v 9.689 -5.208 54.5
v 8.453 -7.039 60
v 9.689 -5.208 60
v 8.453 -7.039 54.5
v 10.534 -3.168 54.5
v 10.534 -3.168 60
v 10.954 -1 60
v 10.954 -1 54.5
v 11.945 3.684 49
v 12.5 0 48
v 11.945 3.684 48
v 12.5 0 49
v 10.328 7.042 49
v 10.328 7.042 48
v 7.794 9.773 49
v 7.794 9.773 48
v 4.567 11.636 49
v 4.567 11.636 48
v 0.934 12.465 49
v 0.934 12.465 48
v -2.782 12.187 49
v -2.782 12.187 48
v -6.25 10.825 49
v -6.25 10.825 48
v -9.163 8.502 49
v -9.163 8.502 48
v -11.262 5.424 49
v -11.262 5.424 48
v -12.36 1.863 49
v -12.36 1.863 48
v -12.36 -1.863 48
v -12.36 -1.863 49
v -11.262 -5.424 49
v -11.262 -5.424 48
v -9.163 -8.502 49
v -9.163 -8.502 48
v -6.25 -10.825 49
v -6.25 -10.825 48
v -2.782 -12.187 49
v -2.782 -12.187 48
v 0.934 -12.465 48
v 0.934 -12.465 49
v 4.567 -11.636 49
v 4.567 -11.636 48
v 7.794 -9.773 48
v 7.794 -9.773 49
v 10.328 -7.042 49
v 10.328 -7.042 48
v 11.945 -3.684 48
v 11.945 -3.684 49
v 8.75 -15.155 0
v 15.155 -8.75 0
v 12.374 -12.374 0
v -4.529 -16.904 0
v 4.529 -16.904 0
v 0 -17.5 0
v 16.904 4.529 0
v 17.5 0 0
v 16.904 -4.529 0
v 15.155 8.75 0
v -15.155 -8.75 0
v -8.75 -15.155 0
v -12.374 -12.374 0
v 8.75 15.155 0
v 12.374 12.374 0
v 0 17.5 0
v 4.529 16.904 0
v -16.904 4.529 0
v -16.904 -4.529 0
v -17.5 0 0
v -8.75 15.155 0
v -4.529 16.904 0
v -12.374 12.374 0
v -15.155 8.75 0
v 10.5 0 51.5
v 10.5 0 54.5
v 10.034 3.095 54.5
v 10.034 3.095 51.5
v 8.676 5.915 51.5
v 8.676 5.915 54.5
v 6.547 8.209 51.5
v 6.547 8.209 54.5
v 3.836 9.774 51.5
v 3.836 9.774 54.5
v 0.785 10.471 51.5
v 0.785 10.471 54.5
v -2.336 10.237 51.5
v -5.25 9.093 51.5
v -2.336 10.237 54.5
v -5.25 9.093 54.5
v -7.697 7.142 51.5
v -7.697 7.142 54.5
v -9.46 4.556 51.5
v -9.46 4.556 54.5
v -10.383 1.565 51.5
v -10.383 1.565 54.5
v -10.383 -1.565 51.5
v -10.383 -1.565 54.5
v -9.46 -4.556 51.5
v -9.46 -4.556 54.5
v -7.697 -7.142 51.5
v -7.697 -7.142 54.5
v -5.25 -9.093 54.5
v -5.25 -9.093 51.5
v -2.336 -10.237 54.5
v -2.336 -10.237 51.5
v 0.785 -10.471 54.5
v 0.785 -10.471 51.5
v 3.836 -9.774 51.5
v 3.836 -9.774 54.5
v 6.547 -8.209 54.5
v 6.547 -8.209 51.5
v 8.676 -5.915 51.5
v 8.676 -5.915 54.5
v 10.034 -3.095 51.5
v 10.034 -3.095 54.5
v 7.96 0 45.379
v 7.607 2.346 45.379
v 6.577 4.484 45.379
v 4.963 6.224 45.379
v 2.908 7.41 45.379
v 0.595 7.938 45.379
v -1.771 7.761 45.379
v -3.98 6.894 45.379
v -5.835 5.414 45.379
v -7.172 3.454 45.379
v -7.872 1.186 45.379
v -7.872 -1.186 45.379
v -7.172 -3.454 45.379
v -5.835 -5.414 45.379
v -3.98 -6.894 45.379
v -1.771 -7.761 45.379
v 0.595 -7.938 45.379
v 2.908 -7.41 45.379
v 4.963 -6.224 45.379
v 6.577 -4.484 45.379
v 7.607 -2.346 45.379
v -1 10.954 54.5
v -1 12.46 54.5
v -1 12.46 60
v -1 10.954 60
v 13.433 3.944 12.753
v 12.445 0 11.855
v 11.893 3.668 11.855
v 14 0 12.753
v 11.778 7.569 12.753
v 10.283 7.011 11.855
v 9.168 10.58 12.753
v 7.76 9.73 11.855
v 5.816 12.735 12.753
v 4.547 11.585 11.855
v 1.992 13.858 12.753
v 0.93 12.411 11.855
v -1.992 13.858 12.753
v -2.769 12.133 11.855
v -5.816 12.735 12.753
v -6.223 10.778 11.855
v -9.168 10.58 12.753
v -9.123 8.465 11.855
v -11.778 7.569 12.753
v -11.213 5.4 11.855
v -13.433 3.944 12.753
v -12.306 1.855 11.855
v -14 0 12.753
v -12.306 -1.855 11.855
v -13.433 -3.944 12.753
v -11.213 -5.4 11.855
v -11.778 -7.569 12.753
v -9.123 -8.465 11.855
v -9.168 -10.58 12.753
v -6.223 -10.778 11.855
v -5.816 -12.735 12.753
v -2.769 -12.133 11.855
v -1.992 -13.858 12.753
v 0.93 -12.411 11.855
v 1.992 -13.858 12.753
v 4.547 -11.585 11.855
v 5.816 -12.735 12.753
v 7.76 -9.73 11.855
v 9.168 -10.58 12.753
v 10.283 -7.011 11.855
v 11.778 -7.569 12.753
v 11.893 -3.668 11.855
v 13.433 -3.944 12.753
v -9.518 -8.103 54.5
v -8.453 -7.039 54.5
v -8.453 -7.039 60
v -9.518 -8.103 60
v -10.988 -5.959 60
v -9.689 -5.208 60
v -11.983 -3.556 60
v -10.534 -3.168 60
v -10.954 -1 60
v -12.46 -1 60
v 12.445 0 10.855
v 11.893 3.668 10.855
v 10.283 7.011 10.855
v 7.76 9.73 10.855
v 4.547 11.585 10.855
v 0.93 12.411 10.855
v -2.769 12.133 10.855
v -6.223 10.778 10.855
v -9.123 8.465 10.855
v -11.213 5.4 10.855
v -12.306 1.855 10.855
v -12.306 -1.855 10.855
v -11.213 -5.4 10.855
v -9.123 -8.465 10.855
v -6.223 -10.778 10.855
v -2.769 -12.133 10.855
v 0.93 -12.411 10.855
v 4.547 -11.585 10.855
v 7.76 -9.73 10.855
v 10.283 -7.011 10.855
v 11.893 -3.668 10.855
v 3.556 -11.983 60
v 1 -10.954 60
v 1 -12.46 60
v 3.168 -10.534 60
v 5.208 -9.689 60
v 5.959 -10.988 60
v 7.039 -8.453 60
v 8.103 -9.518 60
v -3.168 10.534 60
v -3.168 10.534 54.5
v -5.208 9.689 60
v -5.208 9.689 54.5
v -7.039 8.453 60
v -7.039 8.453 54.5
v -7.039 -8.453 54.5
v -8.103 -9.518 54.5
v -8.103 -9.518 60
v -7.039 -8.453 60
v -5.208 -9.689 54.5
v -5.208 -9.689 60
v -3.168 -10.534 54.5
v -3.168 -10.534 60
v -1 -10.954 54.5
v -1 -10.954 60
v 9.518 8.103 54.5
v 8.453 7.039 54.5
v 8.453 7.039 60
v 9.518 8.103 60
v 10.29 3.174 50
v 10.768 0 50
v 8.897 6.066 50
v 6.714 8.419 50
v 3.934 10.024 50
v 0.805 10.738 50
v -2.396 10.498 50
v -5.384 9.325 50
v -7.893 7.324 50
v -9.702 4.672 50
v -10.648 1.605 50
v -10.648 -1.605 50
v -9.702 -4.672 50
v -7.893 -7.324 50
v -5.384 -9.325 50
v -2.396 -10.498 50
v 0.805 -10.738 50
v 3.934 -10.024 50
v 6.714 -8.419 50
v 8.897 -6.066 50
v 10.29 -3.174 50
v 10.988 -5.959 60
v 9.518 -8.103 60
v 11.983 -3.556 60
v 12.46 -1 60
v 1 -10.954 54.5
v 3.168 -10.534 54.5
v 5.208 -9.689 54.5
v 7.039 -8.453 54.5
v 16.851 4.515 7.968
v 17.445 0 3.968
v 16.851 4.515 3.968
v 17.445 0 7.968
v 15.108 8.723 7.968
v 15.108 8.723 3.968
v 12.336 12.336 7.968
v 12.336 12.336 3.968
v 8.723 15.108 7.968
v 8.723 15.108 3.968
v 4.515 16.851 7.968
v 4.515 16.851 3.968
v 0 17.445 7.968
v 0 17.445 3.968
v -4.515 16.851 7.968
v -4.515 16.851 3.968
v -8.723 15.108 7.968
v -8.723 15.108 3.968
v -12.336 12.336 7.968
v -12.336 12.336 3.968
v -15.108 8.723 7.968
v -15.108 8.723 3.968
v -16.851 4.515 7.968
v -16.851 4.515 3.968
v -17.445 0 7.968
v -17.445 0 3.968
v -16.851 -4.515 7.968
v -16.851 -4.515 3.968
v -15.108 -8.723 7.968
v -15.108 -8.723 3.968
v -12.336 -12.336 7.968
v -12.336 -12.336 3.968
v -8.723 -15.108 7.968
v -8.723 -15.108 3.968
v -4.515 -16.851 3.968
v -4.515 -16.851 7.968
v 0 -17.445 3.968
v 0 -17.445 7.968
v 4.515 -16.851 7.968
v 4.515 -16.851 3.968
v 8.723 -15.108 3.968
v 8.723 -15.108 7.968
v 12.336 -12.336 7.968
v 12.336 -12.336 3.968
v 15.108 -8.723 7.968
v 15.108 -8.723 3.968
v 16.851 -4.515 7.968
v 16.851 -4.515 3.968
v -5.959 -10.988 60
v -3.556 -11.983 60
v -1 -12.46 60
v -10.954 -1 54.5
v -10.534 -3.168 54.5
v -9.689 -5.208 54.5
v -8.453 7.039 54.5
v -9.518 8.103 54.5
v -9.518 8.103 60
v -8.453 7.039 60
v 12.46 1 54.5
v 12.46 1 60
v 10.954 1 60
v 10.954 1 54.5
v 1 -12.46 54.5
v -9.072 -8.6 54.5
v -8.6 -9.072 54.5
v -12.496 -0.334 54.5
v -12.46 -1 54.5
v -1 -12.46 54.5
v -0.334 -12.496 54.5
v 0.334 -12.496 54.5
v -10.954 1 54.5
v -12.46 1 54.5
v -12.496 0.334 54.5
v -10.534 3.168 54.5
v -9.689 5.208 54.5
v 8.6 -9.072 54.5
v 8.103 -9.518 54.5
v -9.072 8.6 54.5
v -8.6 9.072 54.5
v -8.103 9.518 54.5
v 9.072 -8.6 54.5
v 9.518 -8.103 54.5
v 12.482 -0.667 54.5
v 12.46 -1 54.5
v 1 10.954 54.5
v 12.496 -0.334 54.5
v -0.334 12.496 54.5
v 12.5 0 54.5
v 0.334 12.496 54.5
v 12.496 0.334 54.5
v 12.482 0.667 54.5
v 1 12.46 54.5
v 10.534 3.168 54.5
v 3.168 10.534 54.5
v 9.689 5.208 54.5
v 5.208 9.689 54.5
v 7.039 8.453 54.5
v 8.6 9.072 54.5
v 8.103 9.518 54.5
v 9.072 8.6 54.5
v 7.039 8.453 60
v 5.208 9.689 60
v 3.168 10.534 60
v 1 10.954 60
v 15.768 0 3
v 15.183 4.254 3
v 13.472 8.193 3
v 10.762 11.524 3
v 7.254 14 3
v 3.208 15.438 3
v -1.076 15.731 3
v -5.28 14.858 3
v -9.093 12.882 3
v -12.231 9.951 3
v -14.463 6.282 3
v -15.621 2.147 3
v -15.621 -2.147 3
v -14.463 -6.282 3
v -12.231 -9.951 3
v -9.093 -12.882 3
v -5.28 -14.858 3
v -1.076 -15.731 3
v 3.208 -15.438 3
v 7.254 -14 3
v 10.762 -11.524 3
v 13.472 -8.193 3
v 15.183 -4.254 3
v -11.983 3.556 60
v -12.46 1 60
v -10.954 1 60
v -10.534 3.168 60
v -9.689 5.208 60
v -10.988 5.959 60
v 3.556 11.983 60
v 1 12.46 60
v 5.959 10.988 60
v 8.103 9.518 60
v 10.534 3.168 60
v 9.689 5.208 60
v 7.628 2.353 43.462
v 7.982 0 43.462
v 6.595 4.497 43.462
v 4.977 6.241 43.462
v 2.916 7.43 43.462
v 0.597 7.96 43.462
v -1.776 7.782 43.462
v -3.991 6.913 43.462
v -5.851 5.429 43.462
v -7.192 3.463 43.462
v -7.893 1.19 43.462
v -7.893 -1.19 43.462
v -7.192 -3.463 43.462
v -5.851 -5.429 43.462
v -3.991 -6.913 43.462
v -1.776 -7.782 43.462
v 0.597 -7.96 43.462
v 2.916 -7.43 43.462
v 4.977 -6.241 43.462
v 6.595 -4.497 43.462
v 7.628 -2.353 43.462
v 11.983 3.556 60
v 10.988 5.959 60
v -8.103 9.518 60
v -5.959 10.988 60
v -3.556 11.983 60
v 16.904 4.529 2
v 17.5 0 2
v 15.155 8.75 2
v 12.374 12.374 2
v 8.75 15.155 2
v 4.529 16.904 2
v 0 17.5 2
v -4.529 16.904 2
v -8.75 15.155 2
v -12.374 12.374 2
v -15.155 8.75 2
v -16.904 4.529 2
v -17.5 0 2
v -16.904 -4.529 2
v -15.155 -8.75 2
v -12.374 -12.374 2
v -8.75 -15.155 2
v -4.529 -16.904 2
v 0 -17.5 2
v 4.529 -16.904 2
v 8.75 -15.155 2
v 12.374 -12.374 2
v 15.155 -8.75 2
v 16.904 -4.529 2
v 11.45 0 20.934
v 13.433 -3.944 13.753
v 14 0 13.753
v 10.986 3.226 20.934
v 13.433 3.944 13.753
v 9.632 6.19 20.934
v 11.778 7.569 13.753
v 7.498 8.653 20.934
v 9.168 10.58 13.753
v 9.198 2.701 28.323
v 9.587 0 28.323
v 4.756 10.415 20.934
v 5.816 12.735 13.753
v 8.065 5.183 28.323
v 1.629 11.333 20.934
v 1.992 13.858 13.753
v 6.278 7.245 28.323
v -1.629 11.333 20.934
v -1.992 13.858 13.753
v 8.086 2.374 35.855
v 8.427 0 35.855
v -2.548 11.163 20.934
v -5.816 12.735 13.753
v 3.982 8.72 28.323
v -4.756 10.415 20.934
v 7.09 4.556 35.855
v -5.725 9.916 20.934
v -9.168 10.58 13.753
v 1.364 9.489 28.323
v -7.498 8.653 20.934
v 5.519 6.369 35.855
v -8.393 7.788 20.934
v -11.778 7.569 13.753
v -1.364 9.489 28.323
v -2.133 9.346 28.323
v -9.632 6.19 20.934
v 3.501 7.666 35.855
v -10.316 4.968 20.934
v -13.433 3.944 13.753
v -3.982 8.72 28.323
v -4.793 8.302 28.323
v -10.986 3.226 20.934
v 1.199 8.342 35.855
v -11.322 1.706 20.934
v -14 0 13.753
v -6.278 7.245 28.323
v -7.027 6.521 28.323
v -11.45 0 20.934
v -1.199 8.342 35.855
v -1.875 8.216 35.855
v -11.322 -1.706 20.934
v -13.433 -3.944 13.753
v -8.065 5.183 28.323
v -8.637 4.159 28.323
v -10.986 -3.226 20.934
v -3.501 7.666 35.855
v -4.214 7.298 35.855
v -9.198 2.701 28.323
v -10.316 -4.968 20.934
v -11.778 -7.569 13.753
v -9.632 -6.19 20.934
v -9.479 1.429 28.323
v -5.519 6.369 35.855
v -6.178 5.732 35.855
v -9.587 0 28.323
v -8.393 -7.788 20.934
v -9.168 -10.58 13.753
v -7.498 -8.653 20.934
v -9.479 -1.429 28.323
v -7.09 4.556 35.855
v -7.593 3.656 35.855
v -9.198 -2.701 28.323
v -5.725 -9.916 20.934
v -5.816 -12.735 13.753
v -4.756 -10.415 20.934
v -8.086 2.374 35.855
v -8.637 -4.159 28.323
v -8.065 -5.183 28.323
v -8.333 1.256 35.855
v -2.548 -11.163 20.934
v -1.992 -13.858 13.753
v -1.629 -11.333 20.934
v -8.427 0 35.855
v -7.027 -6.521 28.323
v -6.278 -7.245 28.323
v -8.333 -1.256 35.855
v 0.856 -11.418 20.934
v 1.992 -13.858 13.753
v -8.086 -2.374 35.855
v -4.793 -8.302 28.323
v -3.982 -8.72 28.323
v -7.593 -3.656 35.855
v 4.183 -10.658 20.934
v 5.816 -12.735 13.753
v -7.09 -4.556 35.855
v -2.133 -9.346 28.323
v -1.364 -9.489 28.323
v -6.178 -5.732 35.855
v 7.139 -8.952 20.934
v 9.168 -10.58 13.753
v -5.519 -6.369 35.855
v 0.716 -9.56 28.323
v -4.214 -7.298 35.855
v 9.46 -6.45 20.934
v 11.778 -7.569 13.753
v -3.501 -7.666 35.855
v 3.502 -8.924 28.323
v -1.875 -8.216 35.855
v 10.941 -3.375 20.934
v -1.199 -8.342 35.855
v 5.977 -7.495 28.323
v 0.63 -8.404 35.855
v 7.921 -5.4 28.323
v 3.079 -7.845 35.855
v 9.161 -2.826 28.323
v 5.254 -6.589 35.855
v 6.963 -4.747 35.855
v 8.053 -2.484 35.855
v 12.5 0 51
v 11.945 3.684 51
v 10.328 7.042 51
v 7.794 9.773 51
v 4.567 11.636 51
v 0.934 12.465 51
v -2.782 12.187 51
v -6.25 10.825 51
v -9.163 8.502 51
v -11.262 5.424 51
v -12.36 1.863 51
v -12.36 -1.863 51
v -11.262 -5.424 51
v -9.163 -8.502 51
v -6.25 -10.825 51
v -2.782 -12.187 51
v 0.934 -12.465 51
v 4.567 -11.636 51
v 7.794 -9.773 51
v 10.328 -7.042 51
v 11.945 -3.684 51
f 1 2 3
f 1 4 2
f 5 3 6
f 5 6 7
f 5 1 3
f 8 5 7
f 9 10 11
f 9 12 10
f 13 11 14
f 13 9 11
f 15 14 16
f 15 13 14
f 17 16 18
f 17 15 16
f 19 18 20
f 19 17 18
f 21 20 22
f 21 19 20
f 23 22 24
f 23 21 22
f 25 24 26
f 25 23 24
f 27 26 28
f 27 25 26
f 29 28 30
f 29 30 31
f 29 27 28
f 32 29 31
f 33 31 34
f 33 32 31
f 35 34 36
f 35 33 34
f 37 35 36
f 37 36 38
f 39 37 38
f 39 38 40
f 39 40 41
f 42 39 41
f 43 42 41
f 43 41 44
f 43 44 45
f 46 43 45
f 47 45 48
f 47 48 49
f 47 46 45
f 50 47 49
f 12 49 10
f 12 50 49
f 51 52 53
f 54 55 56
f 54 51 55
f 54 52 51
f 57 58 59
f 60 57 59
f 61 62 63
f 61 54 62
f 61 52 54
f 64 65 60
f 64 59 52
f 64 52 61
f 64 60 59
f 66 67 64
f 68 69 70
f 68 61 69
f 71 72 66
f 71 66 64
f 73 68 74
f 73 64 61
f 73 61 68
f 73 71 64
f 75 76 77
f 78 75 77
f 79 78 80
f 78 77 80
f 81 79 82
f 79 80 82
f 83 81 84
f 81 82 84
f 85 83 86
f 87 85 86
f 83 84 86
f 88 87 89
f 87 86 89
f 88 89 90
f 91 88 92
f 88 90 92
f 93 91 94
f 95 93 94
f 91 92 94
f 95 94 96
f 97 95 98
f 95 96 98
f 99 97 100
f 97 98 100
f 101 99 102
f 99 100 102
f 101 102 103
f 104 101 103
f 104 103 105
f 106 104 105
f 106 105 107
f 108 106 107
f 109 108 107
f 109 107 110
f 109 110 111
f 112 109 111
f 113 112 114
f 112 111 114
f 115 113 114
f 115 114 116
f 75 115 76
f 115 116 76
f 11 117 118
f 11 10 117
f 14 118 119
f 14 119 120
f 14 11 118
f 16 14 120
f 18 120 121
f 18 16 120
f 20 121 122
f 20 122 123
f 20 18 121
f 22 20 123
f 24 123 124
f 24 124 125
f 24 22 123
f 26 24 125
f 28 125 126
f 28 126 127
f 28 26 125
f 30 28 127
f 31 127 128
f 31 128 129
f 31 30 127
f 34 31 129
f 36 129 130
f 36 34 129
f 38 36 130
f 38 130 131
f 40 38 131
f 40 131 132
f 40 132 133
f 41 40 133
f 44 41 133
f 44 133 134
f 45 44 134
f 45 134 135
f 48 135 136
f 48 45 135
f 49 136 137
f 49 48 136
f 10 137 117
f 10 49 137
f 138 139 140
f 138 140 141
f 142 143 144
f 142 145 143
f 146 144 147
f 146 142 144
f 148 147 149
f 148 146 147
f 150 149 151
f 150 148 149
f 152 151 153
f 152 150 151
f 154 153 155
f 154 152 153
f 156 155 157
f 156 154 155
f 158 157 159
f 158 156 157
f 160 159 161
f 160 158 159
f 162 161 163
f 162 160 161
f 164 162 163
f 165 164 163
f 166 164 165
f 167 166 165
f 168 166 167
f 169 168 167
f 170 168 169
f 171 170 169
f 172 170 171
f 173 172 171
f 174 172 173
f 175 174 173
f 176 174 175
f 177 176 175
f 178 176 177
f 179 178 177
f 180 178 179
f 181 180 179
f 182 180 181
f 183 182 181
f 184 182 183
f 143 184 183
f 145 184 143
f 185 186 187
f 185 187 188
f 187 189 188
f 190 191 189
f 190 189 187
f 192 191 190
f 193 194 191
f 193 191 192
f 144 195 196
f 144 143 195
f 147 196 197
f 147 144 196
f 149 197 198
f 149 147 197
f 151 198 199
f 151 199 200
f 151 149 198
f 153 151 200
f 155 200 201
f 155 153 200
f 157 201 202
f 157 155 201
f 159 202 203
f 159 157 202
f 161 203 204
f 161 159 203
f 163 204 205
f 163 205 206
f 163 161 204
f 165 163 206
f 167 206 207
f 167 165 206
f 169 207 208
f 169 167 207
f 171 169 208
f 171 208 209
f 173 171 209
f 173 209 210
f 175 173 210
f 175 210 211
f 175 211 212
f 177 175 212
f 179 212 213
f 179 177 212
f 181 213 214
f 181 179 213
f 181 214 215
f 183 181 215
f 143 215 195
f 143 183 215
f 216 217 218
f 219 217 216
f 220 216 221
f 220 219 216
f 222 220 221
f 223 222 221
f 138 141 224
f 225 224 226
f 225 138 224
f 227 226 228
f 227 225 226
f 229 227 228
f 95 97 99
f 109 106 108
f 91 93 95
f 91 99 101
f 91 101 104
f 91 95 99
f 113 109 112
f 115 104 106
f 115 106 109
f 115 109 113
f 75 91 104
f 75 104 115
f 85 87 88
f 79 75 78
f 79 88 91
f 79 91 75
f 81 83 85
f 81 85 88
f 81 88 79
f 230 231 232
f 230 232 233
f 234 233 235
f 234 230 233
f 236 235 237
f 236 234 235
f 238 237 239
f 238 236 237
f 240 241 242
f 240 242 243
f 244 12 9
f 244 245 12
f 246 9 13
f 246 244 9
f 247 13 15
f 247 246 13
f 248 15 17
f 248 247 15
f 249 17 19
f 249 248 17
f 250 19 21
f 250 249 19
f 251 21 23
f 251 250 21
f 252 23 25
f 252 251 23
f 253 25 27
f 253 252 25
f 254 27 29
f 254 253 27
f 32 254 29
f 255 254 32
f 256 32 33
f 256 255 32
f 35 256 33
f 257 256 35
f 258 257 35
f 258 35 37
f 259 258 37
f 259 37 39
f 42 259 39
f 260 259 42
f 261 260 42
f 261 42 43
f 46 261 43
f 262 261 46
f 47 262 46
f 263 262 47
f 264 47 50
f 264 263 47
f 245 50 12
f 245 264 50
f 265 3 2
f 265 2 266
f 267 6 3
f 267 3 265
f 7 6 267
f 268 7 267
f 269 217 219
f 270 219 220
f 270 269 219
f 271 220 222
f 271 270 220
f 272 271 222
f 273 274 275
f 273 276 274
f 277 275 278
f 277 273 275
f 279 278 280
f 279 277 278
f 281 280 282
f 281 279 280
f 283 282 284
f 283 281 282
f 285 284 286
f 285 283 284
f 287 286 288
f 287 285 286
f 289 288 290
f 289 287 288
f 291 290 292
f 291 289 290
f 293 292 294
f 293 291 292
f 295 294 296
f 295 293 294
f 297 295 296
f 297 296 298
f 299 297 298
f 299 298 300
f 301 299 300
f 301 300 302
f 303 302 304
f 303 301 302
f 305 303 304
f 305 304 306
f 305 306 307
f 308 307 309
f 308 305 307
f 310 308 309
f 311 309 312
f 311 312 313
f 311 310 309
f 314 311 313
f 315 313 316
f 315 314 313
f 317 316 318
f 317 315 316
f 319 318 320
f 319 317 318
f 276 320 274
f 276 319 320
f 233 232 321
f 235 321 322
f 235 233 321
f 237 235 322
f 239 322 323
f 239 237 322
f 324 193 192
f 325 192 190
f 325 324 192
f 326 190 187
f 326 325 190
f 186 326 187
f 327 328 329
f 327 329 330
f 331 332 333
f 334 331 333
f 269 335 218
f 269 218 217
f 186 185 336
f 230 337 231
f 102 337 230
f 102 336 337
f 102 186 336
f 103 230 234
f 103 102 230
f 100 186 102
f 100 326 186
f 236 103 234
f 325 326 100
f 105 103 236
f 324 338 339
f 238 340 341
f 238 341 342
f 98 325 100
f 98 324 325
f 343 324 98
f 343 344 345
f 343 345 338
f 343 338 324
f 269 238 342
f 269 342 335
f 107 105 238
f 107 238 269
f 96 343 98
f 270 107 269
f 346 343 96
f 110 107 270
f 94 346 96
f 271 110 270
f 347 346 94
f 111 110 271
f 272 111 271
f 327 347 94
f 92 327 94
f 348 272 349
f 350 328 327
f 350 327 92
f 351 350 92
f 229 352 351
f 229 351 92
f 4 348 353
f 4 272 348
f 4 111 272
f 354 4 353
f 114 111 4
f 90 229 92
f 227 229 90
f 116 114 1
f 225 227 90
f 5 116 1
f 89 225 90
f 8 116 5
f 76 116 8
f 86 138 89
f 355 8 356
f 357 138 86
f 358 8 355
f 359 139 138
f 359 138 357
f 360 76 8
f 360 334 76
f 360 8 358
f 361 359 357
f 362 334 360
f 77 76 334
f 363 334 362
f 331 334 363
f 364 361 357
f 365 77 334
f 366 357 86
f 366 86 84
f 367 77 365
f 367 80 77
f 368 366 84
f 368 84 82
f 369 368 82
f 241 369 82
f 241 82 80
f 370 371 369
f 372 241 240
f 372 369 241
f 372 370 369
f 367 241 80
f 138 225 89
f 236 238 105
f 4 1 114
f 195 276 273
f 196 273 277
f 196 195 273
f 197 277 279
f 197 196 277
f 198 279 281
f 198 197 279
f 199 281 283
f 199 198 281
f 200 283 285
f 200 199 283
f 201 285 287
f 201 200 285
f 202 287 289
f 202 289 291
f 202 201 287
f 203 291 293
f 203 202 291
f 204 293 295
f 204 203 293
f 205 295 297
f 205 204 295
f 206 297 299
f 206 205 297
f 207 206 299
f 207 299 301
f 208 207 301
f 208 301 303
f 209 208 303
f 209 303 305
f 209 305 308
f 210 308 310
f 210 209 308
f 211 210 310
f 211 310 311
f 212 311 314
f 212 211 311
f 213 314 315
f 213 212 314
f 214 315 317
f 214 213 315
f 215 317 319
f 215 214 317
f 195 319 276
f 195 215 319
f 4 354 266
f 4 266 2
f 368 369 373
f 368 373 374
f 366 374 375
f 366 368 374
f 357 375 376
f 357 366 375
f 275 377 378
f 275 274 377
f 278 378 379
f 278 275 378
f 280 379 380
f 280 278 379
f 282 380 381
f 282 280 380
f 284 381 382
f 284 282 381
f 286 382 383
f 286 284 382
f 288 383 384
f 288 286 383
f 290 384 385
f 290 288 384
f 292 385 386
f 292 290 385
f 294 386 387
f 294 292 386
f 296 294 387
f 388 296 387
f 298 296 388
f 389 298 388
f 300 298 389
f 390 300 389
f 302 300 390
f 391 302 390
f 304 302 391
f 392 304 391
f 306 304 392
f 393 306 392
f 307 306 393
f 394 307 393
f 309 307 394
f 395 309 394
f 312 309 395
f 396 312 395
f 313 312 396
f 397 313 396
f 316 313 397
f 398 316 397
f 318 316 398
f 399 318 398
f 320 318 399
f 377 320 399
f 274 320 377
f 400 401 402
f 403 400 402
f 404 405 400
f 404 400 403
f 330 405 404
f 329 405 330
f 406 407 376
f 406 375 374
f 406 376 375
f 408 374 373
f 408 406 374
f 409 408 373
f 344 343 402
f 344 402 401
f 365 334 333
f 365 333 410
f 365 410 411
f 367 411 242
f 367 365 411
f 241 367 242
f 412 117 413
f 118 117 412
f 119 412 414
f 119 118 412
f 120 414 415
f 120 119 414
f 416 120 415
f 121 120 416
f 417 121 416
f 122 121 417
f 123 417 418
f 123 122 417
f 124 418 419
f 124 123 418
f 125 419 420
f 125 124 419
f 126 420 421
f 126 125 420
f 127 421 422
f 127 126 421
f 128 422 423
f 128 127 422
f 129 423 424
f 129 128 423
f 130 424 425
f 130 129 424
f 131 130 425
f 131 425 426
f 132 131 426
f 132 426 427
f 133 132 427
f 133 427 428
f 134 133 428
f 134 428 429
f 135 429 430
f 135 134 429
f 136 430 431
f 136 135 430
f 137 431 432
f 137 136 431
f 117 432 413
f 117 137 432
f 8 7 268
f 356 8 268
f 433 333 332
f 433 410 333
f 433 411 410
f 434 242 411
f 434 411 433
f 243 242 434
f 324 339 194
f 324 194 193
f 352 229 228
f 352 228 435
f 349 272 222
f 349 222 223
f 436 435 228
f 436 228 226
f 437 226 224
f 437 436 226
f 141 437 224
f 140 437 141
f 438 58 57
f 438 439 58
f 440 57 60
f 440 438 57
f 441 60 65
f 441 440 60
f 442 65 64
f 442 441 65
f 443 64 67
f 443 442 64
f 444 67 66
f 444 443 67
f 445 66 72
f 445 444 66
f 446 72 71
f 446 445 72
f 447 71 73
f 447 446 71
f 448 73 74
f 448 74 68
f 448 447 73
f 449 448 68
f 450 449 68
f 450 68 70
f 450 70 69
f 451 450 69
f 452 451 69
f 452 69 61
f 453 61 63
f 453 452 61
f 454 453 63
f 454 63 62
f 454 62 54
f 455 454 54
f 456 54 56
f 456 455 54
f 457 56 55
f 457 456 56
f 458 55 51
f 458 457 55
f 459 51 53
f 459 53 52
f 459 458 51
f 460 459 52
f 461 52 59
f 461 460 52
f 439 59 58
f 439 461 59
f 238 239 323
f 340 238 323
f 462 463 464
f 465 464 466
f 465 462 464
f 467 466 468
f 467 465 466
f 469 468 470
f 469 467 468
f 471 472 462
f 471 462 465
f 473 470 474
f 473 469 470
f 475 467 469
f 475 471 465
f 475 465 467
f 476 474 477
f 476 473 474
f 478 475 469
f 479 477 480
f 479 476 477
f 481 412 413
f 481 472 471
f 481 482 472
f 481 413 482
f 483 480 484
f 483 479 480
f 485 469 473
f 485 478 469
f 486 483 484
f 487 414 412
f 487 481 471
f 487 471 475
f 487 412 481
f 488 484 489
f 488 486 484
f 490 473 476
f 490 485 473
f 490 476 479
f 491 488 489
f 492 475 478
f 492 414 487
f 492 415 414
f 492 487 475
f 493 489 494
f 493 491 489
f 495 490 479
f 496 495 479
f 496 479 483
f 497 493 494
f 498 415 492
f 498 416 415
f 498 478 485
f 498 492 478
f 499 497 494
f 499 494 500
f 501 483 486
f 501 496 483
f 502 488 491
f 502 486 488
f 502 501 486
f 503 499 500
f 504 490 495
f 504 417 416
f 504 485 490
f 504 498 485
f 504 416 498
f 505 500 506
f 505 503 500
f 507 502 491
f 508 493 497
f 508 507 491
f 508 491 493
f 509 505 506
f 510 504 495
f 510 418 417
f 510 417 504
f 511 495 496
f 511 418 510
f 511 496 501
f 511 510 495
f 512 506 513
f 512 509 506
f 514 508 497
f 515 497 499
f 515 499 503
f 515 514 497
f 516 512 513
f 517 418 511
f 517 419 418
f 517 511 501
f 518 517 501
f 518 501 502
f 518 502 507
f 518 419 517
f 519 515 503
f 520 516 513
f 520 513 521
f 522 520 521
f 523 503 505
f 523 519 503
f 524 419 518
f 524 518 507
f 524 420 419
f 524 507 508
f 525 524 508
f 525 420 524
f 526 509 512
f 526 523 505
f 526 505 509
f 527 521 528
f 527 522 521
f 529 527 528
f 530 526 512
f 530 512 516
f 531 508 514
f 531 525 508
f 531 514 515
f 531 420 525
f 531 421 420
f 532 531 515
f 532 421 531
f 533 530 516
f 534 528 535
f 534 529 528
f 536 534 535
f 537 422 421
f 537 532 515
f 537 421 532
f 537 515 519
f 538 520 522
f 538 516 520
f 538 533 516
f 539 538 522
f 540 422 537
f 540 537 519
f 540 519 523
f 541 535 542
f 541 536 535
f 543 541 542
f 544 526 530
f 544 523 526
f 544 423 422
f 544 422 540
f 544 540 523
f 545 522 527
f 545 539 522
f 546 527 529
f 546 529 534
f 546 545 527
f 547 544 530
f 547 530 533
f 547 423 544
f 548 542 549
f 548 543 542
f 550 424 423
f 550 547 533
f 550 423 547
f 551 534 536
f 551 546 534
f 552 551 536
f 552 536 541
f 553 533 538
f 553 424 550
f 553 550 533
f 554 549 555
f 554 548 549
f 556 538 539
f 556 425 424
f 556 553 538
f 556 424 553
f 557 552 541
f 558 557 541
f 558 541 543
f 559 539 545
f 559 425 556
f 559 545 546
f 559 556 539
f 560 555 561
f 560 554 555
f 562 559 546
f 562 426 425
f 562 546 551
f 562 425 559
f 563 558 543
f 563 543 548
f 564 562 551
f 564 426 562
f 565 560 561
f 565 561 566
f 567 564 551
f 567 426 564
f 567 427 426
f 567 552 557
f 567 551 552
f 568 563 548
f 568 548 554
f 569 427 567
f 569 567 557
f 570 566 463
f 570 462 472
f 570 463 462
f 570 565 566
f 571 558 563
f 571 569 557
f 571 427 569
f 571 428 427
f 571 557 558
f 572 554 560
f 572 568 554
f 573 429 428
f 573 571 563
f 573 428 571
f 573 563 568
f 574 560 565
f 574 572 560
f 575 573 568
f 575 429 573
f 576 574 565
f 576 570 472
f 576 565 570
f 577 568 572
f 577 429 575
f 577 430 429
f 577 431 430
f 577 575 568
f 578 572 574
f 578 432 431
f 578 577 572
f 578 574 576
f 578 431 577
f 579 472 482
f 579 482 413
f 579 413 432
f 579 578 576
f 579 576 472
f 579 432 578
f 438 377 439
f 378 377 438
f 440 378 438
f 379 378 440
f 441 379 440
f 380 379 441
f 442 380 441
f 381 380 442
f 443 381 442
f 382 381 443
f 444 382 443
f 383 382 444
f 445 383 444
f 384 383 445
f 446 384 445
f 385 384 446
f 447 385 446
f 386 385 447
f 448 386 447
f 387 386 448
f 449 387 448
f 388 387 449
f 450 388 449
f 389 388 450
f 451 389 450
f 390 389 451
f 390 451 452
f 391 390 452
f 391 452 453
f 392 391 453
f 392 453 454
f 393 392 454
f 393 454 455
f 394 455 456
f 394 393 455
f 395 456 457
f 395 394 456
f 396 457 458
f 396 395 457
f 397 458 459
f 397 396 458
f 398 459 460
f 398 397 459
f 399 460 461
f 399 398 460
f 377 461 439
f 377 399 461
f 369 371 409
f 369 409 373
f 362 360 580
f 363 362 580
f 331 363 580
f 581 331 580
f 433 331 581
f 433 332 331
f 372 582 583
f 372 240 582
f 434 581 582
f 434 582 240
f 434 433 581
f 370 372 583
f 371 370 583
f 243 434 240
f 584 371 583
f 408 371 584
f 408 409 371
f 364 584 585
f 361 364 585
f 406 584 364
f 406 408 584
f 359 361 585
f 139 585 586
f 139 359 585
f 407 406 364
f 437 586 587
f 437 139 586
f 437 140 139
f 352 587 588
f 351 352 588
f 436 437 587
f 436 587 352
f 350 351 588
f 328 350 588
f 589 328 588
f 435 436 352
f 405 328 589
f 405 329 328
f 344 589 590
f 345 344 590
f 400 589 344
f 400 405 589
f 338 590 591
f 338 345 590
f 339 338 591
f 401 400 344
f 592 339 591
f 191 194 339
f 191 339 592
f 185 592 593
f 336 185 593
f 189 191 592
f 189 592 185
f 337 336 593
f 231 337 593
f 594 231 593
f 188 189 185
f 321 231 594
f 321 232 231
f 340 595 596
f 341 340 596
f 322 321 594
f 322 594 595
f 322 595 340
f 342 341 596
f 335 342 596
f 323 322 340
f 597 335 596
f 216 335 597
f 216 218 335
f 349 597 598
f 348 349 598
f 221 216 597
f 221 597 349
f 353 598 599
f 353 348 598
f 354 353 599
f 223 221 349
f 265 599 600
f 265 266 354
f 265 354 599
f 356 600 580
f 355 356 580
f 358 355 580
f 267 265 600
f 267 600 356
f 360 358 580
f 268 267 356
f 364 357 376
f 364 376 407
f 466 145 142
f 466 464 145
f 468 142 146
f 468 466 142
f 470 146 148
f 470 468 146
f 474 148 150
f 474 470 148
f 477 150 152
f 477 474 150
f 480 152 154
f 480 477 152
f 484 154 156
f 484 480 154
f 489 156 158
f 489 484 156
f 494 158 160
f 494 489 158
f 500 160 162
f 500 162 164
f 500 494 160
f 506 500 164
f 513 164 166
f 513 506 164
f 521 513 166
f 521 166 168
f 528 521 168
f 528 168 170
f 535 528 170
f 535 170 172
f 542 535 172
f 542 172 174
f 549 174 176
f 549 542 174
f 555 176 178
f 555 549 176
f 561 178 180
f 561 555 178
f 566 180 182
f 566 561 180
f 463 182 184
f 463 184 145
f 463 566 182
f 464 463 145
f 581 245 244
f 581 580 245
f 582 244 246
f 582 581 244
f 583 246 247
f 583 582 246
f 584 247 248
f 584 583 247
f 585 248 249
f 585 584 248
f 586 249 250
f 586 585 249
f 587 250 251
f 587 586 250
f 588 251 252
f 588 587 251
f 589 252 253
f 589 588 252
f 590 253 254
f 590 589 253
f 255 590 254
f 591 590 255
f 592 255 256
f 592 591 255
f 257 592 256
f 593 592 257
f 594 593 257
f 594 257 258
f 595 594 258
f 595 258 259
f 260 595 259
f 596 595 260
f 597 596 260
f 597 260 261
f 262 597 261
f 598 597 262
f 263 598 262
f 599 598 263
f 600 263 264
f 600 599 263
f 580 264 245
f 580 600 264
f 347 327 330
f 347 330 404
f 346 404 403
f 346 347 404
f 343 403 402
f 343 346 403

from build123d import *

# Parameters (mm, degrees)
F3_DEPTH = 27
F4_R     = 10.5
F5_DEPTH = 3


with BuildPart() as f1:
    # F0 (on Front) → F1 (revolve)
    with BuildSketch(Plane.XZ):
        with BuildLine():
            Line((0, 6), (0, 0))
            Line((0, 0), (17.5, 0))
            Line((17.5, 0), (17.5, 2))
            Line((17.5, 2), (15.767949, 3))
            Line((15.767949, 3), (17.445428, 3.968493))
            Line((17.445428, 3.968493), (17.445428, 7.968493))
            Line((17.445428, 7.968493), (12.445428, 10.855244))
            Line((12.445428, 10.855244), (12.445428, 11.855244))
            Line((12.445428, 11.855244), (14, 12.752777))
            Line((14, 12.752777), (14, 13.752777))
            ThreePointArc((14, 13.752777), (9.586573, 28.322839), (7.982154, 43.461892))
            Line((7.982154, 43.461892), (7.960461, 45.379096))
            Line((7.960461, 45.379096), (12.5, 48))
            Line((12.5, 48), (12.5, 49))
            Line((12.5, 49), (10.767949, 50))
            Line((10.767949, 50), (12.5, 51))
            Line((12.5, 51), (12.5, 60))
            Line((12.5, 60), (11, 60))
            Line((11, 60), (11, 54.5))
            Line((11, 54.5), (0, 54.5))
            Line((0, 54.5), (0, 6))
        make_face()
    revolve(axis=Axis((0, 0, 30), (0, 0, 1)))

    # F2 (on face) → F3 (cut)
    with BuildSketch(Plane.XY.offset(54.5)):
        Polygon((1, 0), (0, 0), (-0.707107, 0.707107), (-1, 0.414214), (-1, -0.414214), (-0.414214, -1), (0.414214, -1), (1, -1), (1, -0.414214), align=None)
        Polygon((2.414214, 1), (1.414214, 0), (33.121221, 0), (33.121221, 1), align=None)
        Polygon((33.121221, 0), (1.414214, 0), (2.414214, -1), (33.121221, -1), align=None)
        Polygon((-1, 2.414214), (0, 1.414214), (0, 23.9831), (-1, 23.9831), align=None)
        Polygon((0, 23.9831), (0, 1.414214), (1, 2.414214), (1, 23.9831), align=None)
        Polygon((21.433732, 21.433732), (1, 1), (2.414214, 1), (22.140839, 20.726625), align=None)
        Polygon((1, 2.414214), (1, 1), (21.433732, 21.433732), (20.726625, 22.140839), align=None)
        Polygon((-18.999232, 18.999232), (-1, 1), (-1, 2.414214), (-18.31192, 19.726133), align=None)
        Polygon((-2.414214, 1), (-1, 1), (-18.999232, 18.999232), (-19.686545, 18.272332), align=None)
        Polygon((21.433732, -20.019518), (2.414214, -1), (1, -1), (1, -2.414214), (20.019518, -21.433732), align=None)
        Polygon((-2.414214, -1), (-1.414214, 0), (-2.414214, 1), (-22.418227, 1), (-22.418227, -1), align=None)
        Polygon((1, -22.243075), (1, -2.414214), (0, -1.414214), (-1, -2.414214), (-1, -22.243075), align=None)
        Polygon((-1, -2.414214), (-1, -1), (-2.414214, -1), (-23.888705, -22.474491), (-22.474491, -23.888705), align=None)
    extrude(amount=F3_DEPTH, mode=Mode.SUBTRACT)

    # F4 (on face) → F5 (cut)
    with BuildSketch(Plane.XY.offset(54.5)):
        Circle(F4_R)
    extrude(amount=-F5_DEPTH, mode=Mode.SUBTRACT)


solid = f1.part
